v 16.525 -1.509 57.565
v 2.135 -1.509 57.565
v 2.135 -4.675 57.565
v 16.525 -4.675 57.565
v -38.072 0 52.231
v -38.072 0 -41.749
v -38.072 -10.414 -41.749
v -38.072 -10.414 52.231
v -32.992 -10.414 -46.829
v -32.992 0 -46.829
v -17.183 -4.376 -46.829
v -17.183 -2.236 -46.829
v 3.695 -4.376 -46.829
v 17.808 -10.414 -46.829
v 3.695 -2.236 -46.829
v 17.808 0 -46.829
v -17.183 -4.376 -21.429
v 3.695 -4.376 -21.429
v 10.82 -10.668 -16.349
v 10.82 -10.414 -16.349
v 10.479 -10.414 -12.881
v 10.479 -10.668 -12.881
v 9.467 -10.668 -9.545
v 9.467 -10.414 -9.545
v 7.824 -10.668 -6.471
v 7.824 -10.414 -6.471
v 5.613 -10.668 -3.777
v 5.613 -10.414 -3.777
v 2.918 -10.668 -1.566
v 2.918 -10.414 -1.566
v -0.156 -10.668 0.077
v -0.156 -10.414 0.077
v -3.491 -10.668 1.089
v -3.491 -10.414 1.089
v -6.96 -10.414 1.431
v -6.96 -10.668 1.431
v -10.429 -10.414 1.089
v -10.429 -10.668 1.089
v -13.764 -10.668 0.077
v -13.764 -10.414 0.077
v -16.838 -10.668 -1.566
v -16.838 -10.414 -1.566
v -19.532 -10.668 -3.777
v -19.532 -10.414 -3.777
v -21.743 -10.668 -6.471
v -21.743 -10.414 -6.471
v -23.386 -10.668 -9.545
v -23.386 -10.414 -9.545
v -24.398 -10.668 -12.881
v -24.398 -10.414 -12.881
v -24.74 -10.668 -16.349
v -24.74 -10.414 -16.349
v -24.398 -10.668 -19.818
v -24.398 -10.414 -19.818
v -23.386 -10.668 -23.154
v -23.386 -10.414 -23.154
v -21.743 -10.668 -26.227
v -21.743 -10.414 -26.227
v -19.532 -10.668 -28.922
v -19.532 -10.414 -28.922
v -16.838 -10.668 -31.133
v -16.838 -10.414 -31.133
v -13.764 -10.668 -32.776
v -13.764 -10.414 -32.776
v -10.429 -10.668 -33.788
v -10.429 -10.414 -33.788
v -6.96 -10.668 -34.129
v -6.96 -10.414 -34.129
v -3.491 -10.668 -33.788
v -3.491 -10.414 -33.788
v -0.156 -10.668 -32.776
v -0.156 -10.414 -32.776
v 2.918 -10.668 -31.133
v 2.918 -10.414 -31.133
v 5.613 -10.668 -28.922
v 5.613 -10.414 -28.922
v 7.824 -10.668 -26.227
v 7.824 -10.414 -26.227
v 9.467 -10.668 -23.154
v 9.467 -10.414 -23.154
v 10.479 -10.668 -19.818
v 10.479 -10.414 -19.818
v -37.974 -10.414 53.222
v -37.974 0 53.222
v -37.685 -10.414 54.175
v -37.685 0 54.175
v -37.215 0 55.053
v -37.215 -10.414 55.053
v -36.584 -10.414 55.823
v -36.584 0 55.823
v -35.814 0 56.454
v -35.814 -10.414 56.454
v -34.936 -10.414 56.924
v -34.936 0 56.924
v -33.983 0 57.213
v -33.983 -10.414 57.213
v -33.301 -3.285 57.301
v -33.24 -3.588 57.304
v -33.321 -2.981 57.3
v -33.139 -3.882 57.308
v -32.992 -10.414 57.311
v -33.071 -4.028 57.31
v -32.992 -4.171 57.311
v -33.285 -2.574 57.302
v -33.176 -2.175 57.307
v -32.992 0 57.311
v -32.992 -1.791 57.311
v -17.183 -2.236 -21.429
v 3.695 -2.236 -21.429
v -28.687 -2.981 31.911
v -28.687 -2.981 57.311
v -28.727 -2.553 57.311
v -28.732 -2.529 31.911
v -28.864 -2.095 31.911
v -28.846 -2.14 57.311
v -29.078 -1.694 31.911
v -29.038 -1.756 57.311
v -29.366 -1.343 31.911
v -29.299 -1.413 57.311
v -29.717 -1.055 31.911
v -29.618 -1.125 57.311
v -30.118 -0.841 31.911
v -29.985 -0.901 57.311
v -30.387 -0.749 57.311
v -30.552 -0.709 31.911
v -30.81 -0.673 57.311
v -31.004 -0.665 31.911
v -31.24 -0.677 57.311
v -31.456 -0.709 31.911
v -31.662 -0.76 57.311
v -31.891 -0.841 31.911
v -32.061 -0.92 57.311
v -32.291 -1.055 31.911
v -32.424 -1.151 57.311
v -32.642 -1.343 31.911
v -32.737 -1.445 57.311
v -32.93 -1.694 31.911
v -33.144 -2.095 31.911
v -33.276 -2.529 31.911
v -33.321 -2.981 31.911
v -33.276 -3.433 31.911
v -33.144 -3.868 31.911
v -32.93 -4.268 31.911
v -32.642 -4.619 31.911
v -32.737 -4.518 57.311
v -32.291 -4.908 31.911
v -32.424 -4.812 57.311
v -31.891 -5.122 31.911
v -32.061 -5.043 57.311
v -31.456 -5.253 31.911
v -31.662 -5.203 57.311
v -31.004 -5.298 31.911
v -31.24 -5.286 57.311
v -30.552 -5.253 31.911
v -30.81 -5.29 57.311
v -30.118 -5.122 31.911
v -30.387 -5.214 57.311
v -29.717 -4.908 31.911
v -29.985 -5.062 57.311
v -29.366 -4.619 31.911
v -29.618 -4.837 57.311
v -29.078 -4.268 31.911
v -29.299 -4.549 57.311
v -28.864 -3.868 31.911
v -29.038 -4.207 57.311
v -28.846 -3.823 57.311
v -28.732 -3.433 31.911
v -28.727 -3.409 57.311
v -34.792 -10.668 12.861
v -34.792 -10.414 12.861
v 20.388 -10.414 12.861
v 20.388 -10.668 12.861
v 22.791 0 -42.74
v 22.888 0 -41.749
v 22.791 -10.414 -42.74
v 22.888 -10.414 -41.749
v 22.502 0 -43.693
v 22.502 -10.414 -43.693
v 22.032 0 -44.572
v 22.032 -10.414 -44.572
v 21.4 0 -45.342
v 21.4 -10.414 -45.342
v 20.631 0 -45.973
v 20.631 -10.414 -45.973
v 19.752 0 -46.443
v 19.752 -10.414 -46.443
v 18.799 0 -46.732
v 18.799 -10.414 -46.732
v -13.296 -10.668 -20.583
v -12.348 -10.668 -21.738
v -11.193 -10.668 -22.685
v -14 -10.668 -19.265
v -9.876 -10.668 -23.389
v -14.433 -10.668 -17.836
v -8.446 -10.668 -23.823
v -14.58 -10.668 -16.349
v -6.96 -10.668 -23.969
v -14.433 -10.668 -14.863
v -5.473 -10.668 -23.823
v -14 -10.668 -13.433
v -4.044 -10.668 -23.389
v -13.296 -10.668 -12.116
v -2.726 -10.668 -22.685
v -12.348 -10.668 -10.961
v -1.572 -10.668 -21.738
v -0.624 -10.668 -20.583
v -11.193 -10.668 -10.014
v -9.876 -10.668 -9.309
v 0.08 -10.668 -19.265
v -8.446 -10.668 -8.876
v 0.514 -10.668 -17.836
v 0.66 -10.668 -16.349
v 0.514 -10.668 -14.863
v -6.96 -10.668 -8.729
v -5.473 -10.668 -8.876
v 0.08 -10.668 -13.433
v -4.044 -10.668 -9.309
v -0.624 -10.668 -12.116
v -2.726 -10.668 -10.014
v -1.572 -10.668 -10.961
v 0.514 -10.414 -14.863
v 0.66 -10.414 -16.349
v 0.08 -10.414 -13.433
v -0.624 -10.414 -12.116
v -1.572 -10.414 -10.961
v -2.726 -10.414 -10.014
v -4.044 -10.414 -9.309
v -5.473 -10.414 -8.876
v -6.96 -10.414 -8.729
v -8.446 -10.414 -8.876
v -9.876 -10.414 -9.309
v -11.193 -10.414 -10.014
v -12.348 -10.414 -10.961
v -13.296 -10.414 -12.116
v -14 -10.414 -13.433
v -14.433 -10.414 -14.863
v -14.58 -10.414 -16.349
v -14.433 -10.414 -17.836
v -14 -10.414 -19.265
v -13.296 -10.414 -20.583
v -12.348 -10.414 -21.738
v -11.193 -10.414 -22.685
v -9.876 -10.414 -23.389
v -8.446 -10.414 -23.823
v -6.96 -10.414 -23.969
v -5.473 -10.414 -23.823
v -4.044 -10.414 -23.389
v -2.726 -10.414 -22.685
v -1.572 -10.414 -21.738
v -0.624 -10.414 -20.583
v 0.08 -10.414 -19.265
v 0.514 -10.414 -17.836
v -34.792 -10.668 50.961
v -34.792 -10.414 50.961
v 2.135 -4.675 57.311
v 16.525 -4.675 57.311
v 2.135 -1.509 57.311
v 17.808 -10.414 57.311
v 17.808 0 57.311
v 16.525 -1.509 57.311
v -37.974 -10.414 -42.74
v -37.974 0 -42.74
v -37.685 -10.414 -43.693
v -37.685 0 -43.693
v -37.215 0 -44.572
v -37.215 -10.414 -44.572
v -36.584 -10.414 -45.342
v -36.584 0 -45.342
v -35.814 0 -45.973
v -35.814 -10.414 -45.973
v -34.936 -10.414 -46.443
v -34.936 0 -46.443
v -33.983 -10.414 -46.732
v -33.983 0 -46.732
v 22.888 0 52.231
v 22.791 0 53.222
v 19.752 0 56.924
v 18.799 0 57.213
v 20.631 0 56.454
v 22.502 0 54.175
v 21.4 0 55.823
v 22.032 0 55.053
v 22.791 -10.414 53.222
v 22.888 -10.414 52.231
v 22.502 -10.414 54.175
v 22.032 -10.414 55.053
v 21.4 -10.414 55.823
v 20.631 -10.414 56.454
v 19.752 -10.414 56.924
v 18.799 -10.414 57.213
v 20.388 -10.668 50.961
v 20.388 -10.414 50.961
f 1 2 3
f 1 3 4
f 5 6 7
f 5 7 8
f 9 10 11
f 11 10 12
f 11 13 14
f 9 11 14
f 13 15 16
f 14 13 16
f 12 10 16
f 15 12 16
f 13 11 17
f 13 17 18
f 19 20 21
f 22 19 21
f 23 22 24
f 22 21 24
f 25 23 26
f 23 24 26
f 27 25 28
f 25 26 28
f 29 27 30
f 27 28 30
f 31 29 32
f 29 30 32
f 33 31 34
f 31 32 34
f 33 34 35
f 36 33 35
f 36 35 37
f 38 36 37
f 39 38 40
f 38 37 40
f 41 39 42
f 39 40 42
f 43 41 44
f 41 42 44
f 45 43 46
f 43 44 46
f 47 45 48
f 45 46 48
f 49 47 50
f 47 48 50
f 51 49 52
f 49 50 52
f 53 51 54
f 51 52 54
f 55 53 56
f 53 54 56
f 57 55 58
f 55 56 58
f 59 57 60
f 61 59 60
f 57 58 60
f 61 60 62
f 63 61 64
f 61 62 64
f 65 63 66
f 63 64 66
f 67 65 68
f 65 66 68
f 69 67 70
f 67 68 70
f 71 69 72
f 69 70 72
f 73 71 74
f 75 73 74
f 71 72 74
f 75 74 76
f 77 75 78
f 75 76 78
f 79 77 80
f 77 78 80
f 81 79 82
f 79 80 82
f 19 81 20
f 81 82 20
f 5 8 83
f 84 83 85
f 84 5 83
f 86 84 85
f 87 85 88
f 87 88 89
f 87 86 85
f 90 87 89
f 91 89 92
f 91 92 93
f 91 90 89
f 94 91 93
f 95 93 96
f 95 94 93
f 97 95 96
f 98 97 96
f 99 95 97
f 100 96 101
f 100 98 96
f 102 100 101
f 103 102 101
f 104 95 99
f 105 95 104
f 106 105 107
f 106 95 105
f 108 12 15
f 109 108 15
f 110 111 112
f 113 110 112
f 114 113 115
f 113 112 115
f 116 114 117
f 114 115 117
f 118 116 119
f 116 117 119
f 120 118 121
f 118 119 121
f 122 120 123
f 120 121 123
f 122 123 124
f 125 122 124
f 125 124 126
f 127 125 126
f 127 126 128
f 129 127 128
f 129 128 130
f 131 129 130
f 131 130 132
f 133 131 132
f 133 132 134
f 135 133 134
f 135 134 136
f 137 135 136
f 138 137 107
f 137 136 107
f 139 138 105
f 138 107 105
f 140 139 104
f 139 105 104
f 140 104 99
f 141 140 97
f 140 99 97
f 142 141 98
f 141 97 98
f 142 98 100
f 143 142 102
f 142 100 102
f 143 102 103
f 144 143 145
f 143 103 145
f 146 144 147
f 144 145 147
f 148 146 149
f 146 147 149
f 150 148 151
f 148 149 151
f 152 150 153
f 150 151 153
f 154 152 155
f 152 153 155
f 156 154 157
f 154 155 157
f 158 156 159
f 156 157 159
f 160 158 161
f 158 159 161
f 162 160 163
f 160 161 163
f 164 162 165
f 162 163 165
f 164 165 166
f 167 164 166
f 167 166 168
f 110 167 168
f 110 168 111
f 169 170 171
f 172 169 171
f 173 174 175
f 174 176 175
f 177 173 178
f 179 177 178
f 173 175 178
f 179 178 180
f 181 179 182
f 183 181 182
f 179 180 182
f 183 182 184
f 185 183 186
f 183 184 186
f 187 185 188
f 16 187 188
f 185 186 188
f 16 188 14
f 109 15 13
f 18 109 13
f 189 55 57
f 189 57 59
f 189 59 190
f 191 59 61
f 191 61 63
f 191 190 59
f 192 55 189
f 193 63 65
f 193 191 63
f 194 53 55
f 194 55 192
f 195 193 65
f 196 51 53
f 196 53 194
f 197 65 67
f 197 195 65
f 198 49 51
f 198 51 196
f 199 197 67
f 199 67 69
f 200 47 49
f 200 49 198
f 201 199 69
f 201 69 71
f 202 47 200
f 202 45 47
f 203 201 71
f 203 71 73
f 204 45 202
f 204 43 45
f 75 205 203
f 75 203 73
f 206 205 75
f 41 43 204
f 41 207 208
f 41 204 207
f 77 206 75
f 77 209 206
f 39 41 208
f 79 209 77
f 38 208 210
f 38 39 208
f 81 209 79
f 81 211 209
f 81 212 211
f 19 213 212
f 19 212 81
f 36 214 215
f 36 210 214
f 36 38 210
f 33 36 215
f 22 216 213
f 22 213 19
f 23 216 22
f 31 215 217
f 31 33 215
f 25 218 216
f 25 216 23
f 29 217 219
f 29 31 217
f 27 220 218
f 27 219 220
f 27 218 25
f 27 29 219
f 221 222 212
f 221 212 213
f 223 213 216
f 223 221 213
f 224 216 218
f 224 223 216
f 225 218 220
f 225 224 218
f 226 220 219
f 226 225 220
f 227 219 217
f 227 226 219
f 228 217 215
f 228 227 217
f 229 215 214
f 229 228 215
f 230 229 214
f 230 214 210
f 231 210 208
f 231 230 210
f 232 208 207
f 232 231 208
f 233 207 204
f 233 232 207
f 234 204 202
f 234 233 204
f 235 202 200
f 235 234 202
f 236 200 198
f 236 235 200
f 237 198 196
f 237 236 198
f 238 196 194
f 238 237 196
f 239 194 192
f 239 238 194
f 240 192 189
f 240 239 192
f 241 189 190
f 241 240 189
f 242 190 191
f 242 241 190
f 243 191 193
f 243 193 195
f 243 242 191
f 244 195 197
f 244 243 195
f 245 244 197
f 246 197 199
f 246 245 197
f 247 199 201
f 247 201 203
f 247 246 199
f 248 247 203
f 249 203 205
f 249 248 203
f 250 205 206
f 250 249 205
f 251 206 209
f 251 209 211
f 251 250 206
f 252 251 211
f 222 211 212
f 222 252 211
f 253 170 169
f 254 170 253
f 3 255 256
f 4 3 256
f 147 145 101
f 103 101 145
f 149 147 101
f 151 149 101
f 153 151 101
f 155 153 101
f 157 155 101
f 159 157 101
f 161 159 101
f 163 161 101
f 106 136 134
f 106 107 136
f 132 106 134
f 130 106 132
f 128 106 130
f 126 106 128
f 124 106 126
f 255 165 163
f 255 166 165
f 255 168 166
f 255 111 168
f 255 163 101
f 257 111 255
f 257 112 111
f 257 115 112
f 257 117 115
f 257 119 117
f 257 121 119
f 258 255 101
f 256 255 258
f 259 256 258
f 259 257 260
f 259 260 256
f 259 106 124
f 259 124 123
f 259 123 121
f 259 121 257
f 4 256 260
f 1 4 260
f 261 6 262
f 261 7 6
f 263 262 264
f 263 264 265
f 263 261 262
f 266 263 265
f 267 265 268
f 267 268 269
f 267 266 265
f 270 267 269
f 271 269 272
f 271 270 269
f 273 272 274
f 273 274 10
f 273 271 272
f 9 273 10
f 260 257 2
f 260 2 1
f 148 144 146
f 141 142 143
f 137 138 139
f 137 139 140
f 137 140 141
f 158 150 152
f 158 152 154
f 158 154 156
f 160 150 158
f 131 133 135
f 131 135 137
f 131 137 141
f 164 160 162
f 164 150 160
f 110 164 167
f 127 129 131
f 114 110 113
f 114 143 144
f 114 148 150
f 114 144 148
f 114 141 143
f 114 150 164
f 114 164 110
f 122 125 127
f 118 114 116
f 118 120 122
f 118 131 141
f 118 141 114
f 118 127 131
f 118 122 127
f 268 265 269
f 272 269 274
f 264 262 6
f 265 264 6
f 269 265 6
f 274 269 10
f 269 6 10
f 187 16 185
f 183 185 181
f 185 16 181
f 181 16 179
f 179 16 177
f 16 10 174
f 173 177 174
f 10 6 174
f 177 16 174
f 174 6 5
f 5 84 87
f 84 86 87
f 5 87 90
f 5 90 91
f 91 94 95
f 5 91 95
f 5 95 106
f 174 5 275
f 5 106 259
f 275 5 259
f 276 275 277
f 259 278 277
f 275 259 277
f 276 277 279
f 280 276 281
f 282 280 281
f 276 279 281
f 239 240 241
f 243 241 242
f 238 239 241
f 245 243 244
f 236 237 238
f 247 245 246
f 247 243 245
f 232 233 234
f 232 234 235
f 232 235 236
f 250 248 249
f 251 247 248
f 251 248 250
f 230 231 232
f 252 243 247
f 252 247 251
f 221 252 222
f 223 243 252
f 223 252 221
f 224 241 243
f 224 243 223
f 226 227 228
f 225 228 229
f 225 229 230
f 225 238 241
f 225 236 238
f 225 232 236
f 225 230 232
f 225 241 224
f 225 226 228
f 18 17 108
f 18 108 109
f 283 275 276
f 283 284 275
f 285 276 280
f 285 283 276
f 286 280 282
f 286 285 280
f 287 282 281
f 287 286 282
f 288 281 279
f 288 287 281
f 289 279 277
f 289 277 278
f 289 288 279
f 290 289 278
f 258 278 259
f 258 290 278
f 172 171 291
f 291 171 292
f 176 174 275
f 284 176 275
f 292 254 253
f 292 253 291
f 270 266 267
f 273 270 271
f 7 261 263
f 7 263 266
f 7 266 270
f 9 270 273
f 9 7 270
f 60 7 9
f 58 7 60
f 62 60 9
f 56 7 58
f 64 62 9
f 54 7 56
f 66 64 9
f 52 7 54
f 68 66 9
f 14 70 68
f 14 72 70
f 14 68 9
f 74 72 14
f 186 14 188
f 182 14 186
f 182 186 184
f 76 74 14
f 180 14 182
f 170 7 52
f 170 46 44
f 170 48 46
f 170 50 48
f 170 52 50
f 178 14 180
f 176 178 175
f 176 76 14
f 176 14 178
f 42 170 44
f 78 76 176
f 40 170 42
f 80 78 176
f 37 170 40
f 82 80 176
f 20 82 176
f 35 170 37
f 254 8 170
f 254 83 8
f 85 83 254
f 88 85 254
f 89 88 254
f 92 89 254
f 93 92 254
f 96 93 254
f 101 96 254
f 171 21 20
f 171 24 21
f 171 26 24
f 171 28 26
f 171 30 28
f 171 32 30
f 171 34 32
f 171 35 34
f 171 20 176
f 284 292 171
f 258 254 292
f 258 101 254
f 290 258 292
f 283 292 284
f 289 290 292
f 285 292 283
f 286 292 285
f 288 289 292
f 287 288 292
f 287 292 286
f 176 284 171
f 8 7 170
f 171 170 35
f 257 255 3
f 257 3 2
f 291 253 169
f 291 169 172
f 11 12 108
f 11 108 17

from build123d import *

# Parameters (mm, degrees)
F0_W         = 60.96
F0_H         = 104.14
F1_DEPTH     = 10.414
F3_R         = 17.78
F3_R_2       = 7.62
F4_DEPTH     = 0.254
F2_W         = 55.1793798804
F2_H         = 38.1
F5_DEPTH     = 0.254
F6_R         = 2.3165887379
F7_DEPTH     = 25.4
F8_W         = 14.3902888522
F8_H         = 3.1658638036
F9_DEPTH     = 0.254
F10_W        = 20.8778993692
F10_H        = 2.1391292103
F11_DEPTH    = 25.4
F12_R        = 5.08
F13_T1_DEPTH = 35.814
F14_R        = 5.08
F15_R        = 5.08


# Not quite as in the source:
# - a fillet or chamfer that OpenCascade refuses, or shapes differently, is made with other operations: its cross-section is extruded or revolved along the edge and cut away or added


with BuildPart() as f1:
    # F0 (on Front) → F1 (new body)
    with BuildSketch(Plane.XZ):
        with Locations((-7.5916079104, 5.2405595779)):
            Rectangle(F0_W, F0_H)
    extrude(amount=F1_DEPTH)

    # F3 (on face) → F4 (join)
    with BuildSketch(Plane.XZ.offset(10.414)):
        with Locations((-6.9598197006, -16.3494404221)):
            Circle(F3_R)
        with Locations((-6.9598197006, -16.3494404221)):
            Circle(F3_R_2, mode=Mode.SUBTRACT)
    extrude(amount=F4_DEPTH)

    # F2 (on face) → F5 (join)
    with BuildSketch(Plane.XZ.offset(10.414)):
        with Locations((-7.2018355131, 31.9105595779)):
            Rectangle(F2_W, F2_H)
    extrude(amount=F5_DEPTH)

    # F6 (on face) → F7 (cut)
    with BuildSketch(Plane.XY.offset(57.3105595779)):
        with Locations((-31.0040302575, -2.9813330621)):
            Circle(F6_R)
    extrude(amount=-F7_DEPTH, mode=Mode.SUBTRACT)

    # F8 (on face) → F9 (join)
    with BuildSketch(Plane.XY.offset(57.3105595779)):
        with Locations((9.3301092274, -3.0921686557)):
            Rectangle(F8_W, F8_H)
    extrude(amount=F9_DEPTH)

    # F10 (on face) → F11 (cut)
    with BuildSketch(Plane(origin=(0, 0, -46.8294404221), x_dir=(1, 0, 0), z_dir=(0, 0, -1))):
        with Locations((-6.7444174783, 3.3060612623)):
            Rectangle(F10_W, F10_H)
    extrude(amount=-F11_DEPTH, mode=Mode.SUBTRACT)

    # F12
    f12_edges = [f1.edges().sort_by_distance(p)[0] for p in [
        (-38.071608, -5.207, -46.82944),
    ]]
    fillet(f12_edges, radius=F12_R)

    # F13: fillet of radius 5.08 on 1 edges, made by hand

    # F13_s2 → F13_t1 (cut)
    with BuildSketch(Plane.XZ.offset(-12.7)):
        with BuildLine():
            ThreePointArc((-38.0716079104, 52.2305595779), (-36.5837103588, 55.8226620264), (-32.9916079104, 57.3105595779))
            Line((-32.9916079104, 57.3105595779), (-38.0716079104, 57.3105595779))
            Line((-38.0716079104, 57.3105595779), (-38.0716079104, 52.2305595779))
        make_face()
    extrude(amount=F13_T1_DEPTH, mode=Mode.SUBTRACT)

    # F14
    f14_edges = [f1.edges().sort_by_distance(p)[0] for p in [
        (22.888392, -5.207, -46.82944),
    ]]
    fillet(f14_edges, radius=F14_R)

    # F15
    f15_edges = [f1.edges().sort_by_distance(p)[0] for p in [
        (22.888392, -5.207, 57.31056),
    ]]
    fillet(f15_edges, radius=F15_R)


solid = f1.part
